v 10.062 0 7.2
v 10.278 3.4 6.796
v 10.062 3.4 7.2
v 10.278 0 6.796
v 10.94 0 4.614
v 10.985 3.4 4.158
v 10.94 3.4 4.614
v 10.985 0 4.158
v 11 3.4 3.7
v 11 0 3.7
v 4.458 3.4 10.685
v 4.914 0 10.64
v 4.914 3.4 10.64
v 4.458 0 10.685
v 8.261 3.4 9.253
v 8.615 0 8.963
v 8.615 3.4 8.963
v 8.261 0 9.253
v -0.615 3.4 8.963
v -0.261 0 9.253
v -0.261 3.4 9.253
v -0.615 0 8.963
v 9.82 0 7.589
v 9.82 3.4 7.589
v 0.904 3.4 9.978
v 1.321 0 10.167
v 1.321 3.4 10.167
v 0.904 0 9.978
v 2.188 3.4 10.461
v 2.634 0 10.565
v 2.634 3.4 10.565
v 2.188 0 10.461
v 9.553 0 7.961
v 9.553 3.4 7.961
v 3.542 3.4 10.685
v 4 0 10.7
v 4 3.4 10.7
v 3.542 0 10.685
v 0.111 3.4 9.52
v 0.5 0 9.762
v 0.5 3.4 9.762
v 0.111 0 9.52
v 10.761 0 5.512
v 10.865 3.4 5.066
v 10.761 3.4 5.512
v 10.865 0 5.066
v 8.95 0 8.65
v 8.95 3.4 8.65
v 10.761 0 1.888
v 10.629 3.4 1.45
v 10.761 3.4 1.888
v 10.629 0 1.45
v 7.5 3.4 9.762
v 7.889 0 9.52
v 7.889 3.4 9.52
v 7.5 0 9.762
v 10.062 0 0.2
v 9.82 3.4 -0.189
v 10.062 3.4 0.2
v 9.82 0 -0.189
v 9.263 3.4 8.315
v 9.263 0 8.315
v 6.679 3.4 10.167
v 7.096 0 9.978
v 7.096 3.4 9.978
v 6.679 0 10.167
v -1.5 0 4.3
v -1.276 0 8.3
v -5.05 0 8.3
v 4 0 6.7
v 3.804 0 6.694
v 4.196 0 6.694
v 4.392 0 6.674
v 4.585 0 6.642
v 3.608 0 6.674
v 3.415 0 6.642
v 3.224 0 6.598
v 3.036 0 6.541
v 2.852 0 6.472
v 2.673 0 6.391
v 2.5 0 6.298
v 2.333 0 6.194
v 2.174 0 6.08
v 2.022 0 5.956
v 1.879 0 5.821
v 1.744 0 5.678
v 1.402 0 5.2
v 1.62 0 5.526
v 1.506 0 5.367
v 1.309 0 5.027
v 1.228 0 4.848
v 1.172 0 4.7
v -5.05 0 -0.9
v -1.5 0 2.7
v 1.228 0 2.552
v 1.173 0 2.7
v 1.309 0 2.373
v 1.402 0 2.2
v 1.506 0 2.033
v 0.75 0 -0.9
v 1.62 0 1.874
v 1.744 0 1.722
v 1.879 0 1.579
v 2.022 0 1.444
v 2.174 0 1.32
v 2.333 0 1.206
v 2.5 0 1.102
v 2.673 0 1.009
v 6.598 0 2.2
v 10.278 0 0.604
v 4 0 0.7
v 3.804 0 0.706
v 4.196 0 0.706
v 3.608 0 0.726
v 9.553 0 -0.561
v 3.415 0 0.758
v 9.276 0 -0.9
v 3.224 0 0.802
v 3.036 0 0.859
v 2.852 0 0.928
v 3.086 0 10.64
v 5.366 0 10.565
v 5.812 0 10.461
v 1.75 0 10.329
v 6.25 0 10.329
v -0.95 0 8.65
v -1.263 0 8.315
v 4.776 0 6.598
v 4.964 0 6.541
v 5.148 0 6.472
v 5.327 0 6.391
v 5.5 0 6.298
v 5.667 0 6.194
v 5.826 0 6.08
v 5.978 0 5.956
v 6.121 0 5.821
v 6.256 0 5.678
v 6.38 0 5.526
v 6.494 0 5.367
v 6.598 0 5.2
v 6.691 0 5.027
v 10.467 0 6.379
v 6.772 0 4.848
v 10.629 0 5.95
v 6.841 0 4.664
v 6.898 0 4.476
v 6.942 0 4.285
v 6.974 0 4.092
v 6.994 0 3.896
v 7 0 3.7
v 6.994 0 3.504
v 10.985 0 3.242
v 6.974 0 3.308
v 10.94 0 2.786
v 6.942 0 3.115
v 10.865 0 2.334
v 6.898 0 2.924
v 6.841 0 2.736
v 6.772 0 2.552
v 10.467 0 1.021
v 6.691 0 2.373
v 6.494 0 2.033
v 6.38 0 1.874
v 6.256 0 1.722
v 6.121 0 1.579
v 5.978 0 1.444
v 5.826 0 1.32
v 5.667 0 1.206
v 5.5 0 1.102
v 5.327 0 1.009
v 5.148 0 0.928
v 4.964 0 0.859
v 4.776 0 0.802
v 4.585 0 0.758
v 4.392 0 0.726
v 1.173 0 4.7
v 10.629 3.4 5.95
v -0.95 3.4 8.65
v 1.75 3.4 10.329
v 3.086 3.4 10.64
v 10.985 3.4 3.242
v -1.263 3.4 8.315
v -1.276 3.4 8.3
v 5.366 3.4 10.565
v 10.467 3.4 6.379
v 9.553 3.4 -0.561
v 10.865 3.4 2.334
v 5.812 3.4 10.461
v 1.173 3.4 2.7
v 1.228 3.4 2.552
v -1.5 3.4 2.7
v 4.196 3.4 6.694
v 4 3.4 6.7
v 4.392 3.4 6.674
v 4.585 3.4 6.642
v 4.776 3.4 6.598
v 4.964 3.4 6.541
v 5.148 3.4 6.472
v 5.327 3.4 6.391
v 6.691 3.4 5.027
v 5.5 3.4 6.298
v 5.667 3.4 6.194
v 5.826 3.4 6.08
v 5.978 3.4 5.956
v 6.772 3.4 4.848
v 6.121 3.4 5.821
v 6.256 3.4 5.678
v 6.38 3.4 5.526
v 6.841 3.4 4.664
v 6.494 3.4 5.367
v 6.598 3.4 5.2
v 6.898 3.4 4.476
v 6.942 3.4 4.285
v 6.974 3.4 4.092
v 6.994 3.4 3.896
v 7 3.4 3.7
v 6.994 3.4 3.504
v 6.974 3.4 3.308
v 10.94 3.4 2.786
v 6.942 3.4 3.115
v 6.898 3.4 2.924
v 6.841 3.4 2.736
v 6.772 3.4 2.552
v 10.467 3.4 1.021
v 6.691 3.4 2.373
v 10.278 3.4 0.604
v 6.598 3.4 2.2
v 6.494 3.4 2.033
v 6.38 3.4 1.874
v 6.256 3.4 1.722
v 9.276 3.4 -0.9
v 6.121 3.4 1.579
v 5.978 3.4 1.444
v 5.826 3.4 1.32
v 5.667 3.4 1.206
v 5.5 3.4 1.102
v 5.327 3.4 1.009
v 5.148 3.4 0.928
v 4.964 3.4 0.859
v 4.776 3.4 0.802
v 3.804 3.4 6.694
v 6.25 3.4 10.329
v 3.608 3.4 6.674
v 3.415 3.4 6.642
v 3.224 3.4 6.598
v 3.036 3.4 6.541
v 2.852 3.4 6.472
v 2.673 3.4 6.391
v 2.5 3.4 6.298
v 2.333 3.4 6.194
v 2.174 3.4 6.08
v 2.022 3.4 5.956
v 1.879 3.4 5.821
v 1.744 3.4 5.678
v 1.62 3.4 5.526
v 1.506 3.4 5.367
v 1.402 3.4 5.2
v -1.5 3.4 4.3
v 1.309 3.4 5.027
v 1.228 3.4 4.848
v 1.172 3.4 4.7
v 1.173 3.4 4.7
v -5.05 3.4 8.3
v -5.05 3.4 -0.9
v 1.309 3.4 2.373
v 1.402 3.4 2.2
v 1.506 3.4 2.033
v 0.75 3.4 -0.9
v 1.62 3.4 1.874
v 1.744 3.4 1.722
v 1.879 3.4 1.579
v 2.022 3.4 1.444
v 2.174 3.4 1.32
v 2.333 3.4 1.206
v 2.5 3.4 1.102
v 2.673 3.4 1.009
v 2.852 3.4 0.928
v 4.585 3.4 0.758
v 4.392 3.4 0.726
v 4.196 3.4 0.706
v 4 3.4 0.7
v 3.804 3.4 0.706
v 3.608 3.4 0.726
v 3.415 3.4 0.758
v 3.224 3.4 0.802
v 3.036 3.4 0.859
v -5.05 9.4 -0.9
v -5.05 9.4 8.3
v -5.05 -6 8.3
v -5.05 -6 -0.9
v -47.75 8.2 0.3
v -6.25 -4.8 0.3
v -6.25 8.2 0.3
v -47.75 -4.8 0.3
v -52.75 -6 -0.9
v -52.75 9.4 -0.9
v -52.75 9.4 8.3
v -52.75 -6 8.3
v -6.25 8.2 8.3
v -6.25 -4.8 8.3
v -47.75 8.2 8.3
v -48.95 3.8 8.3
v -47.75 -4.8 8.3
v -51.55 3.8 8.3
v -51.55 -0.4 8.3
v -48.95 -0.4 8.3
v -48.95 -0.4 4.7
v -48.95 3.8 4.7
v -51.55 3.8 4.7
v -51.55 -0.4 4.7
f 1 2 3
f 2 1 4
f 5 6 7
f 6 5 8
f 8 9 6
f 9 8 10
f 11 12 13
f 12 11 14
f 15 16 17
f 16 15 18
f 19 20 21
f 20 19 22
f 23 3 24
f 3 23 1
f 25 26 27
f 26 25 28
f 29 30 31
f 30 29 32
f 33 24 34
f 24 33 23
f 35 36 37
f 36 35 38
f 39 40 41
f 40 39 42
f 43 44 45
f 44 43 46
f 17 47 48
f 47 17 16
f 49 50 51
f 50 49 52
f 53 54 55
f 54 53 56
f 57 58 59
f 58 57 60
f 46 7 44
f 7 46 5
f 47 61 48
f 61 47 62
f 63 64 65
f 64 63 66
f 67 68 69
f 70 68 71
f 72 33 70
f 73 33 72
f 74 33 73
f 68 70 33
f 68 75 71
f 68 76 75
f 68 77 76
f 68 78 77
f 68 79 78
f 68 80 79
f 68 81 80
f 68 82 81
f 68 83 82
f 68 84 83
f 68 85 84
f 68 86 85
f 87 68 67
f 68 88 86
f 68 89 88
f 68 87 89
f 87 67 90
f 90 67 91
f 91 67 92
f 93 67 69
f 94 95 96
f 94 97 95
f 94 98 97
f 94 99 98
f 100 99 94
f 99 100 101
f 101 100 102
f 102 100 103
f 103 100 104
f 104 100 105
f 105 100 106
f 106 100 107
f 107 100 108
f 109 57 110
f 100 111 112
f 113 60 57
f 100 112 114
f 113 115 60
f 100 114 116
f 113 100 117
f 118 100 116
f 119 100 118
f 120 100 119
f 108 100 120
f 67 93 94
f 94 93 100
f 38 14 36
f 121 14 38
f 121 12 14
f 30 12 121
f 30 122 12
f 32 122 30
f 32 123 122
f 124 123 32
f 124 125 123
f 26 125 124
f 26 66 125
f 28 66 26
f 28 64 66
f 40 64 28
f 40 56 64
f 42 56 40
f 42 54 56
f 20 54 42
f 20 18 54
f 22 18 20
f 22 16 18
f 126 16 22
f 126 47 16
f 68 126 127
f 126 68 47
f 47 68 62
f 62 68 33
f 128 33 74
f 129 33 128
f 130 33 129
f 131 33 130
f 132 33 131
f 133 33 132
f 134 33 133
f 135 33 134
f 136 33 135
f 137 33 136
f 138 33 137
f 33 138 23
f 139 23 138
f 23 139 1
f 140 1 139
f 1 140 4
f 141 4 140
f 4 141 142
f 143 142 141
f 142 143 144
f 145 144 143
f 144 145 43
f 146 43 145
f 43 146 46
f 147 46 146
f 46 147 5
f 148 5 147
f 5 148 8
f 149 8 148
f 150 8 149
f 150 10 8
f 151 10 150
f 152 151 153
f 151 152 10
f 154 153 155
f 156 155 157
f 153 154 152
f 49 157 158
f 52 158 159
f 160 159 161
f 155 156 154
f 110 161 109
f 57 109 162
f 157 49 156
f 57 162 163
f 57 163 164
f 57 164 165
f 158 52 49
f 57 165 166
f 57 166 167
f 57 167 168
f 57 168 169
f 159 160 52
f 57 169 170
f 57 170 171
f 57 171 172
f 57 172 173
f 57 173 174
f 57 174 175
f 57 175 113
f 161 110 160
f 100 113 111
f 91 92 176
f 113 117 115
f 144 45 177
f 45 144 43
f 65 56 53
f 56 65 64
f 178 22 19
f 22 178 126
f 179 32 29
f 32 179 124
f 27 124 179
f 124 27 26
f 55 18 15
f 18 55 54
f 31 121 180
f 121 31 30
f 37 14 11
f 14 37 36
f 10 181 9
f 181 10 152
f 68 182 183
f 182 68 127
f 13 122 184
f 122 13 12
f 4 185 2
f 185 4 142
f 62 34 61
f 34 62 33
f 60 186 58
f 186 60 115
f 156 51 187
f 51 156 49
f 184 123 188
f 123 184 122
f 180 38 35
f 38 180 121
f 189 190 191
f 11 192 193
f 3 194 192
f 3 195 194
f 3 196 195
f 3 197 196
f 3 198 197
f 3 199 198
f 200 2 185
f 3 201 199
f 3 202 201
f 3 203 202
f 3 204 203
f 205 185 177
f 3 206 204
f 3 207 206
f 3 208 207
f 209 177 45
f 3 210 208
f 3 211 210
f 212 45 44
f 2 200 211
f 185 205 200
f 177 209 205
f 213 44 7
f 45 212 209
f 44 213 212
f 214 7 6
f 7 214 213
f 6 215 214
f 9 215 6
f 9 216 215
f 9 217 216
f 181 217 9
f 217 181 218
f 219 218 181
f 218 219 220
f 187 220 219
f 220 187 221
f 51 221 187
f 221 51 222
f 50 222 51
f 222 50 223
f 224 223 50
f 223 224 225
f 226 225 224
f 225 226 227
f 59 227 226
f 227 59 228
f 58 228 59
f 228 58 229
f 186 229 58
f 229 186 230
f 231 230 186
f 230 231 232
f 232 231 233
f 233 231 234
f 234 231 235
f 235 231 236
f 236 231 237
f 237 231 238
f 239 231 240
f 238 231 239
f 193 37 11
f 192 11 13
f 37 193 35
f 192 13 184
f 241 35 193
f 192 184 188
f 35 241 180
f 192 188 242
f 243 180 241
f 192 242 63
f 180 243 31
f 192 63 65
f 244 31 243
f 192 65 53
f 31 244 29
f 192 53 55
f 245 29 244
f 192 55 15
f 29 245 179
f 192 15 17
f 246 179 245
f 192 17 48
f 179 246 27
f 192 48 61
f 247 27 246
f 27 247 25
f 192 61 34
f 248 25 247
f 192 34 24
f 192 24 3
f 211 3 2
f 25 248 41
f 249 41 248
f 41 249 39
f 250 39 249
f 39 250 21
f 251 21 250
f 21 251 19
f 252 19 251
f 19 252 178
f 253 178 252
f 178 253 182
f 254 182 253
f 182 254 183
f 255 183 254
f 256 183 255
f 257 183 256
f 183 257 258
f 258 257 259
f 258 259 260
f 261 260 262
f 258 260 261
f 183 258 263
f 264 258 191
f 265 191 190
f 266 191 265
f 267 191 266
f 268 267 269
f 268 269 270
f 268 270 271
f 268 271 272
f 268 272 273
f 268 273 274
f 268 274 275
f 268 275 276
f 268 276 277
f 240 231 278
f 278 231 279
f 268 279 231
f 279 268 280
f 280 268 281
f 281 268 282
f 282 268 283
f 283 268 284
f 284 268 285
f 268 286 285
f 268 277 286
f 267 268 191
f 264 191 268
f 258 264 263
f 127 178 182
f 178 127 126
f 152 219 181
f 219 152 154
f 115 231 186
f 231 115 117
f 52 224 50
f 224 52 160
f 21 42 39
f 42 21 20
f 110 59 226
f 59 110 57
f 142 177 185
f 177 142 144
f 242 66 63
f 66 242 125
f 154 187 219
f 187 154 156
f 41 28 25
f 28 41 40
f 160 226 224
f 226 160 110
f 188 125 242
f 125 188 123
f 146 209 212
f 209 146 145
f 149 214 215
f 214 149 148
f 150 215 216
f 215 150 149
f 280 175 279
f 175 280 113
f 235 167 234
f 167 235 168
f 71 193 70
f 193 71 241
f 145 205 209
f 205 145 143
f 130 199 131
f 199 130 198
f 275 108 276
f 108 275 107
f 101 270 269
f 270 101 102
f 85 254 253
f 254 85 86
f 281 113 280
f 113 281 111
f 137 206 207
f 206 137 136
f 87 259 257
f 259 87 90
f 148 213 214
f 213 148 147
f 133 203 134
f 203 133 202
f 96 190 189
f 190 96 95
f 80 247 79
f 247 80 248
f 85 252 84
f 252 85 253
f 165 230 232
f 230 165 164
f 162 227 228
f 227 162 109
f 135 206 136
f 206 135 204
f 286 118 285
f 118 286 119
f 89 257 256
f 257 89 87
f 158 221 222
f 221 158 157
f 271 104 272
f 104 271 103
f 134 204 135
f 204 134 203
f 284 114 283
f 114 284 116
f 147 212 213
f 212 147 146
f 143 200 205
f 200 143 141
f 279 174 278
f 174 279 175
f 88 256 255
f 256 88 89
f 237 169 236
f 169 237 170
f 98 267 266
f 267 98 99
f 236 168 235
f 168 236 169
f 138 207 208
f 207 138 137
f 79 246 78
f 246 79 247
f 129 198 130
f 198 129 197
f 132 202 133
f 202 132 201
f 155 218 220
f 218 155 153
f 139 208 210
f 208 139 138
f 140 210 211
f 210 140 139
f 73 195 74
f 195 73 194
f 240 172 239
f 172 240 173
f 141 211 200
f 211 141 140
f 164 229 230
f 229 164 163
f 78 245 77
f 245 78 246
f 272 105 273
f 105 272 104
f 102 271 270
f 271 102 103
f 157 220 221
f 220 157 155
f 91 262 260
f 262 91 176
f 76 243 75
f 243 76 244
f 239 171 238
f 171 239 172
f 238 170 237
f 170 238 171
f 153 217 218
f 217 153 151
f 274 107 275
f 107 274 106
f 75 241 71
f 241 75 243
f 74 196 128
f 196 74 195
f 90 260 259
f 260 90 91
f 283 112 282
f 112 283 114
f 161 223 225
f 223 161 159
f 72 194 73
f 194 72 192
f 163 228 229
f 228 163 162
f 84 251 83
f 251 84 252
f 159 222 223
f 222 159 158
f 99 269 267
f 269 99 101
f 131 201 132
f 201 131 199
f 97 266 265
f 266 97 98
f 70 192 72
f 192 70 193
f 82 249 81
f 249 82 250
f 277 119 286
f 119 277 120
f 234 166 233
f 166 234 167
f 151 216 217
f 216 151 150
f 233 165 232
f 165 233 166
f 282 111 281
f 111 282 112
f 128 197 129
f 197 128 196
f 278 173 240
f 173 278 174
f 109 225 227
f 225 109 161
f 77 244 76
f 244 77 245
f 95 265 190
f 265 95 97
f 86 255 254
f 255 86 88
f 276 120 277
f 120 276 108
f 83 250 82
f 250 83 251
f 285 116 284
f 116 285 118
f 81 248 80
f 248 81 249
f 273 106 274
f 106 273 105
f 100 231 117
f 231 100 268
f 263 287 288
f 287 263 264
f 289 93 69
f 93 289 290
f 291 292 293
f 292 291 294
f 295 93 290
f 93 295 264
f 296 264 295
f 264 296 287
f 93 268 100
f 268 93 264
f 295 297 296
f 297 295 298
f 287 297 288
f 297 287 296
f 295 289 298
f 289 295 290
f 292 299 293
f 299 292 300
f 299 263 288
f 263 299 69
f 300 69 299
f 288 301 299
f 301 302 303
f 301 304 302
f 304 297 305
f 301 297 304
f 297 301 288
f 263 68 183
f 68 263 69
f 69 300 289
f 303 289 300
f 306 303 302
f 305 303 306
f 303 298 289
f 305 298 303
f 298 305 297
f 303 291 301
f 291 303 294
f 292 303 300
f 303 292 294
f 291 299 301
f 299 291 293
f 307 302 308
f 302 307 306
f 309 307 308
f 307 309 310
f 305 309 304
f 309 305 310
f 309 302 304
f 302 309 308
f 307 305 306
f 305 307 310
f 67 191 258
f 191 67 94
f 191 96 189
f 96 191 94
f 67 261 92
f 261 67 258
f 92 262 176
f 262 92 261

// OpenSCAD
// DOUBLE TAKE FRAMES — DRY/WET UNIVERSAL LATCH
// DTF_RELEASE: 4.0.0
// Release revision: 4.0.0
// Based on latch-and-keeper-v2.0.4-pending.scad and the approved geometry from
// latch-top-eyelet-v0.2.6-experimental.scad.
// Status: CANONICAL.
//
// Pending change in 2.2.4:
// - Extends the removable wet-eyelet cutter-access neck to 2.40 mm in Z.
// - Thickens the permanent eyelet opposite the cut: the radial wall increases
//   from 2.20 to 3.00 mm and its X thickness increases from 3.40 to 4.20 mm.
// - Preserves the 2.40 mm bore, mounting center, and 0.60 mm snip core.
//
// Pending change in 2.2.3:
// - Extends the removable wet-eyelet neck to 1.80 mm in Z so cutter jaws can
//   engage it without loading and splitting the permanent eyelet ring.
// - Retains the centered 0.60 mm one-nozzle core as the actual snip section.
//
// Pending change in 2.2.2:
// - Tapers each wet-loop snip neck through the loop thickness as well as in
//   its Y/Z profile, using opposed conical face reliefs.
// - Leaves only a centered 0.60 mm one-nozzle core to cut while preserving the
//   full-strength permanent ring and root away from the disposable neck.
//
// Pending change in 2.2.1:
// - Toughens only the wet=true top suspension loops: increases their X
//   thickness, radial wall, and latch-root engagement.
// - Replaces the sub-line snip ligament with a calculated tapered neck whose
//   weakest radial section is one predictable 0.60 mm nozzle line.
// - Leaves the standard/dry latch and every mating datum unchanged.
//
// Pending change in 2.2.0:
// - Mirrors the complete wet latch in X about the fixed rig's wall midpoint.
//   The pivot eye, bayonet keyway, weight corral, keyed socket, and both wet
//   suspension eyelets therefore reverse together and remain registered with
//   wall-rig v2.1.0.
// - Keeps wet_latch=false geometry and every local working dimension unchanged.
//
// Pending change in 2.1.3:
// - Replaces each rounded wet-eyelet snip-slot cap with a tapered polygonal
//   void. Its upper roof is 45 degrees in print Z, eliminating the tiny
//   downward-facing cap facets that could form stalactites.
// - Preserves the approved user-facing bridge location and at least 0.45 mm
//   of sacrificial material for post-print snipping.
//
// Pending change in 2.1.2:
// - Raises both user-facing wet-eyelet snip voids by 15 degrees to provide
//   clearer cutter access above the adjoining latch structure.
// - Keeps the 0.90 mm void width and 0.45 mm sacrificial bridge unchanged.
//
// Pending change in 2.1.1:
// - Mirrors both wet-eyelet snip voids across the Y centerline so the slit is
//   visible to the user in the installed assembly.
// - Keeps the approved downward Z orientation, 0.90 mm void width, and
//   0.45 mm sacrificial bridge unchanged.
//
// Pending change in 2.1.0:
// - Adds the same diagonal near-open void to both wet-latch suspension
//   eyelets. Each void merges with the bore but stops 0.45 mm short of the
//   exterior, leaving a one-line sacrificial bridge that can be snipped.
// - The voids exist only on the wet-latch eyelets; dry geometry is unchanged.
//
// Pending change in 2.0.5:
// - Consolidates the standard and double-top-eyelet latch carriages behind one
//   boolean. wet_latch=false emits the unchanged neutral/standard carriage;
//   wet_latch=true adds only the two established top suspension eyelets, far
//   ledge, and buttress from the v0.2.6 wet trial.
// - The 13.0 mm clear pocket, Y=-8.0 mm installed centerline, pivot eye, keyed
//   socket, retaining walls, and flat-floor print orientation are unchanged.
//
$fn = 96;

eps = 0.05;

// 0 = clipless keyed latch only (default)
// 1 = FN-weight latch only
// 2 = legacy C-shaped keeper only
render_part = 0;

// false = neutral/standard dry latch carriage
// true  = standard carriage plus the double top-eyelet wet suspension
wet_latch = false;

// Must match wall-rig v2.1.0. Mirroring about the fixed wall envelope's center
// reverses the wet mechanism without translating or widening the assembly.
wet_rig_wall_x0 = -66.1;
wet_rig_wall_x1 =  16.0;
wet_assembly_mirror_x = (wet_rig_wall_x0 + wet_rig_wall_x1) / 2;

// =========================================================
// FN WEIGHT LATCH
// =========================================================
post_d = 5.5;
// The keyed nub provides axial retention, so this pivot can remain freely
// rotating without the excessive wobble of the former 0.60 mm radial gap.
// A 0.40 mm radial gap remains generous for horizontal-hole shrinkage.
clear_radial = 0.25;
eye_inner_d = post_d + 2 * clear_radial;
eye_outer_d = 14.0;

// Clipless bayonet retention. A single inside/arm-side bore recess admits the
// fixed peg nub only at the installation angle. The outer eye ring stays
// continuous; rotation puts intact bore material behind the nub.
bayonet_lug_outer_r = 5.00;
// A symmetric one-nozzle-wide outer tip is simpler and more reliable than a
// barely visible one-sided taper. The structural root remains 1.80 mm wide.
bayonet_lug_tip_w = 0.60;
bayonet_key_radial_clear = 0.50;
// Preserve the approved 2.00 mm notch height where it meets the bore. At the
// outer mouth, its flat lower edge and diagonal upper roof leave 0.30 mm above
// the symmetric tip and 0.70 mm below it.
bayonet_notch_outer_r = bayonet_lug_outer_r + bayonet_key_radial_clear;
bayonet_notch_w = 2.00;
bayonet_notch_upper_mouth_clear = 0.30;
bayonet_notch_lower_z = -bayonet_notch_w / 2;
bayonet_notch_upper_bore_z = bayonet_notch_w / 2;
bayonet_notch_upper_mouth_z =
    bayonet_lug_tip_w / 2 + bayonet_notch_upper_mouth_clear;
bayonet_notch_bore_x =
    -sqrt(pow(eye_inner_d / 2, 2) - pow(bayonet_notch_upper_bore_z, 2));

latch_t = 3.4;
pivot_x = 4.0;

corral_clear_w_x = 41.5;
corral_clear_d_y = 13.0;
corral_wall_t = 1.2;
corral_depth_z = 8.0;
corral_floor_t = 1.2;
corral_end_wall_t_x = 5.0;
canonical_weight_center_x = -27.0;

// Match the installed latch plane used by the canonical dry-wall rig.
standoff_h = 0.8;
post_h = 4.0;
corral_global_outer_y1 = -0.30;
corral_center_y_target = corral_global_outer_y1
                         - (corral_clear_d_y + 2 * corral_wall_t) / 2;
pad_t = -corral_center_y_target - standoff_h - post_h / 2;
post_y1 = -pad_t - standoff_h - post_h;
latch_install_y = post_y1 + (post_h - latch_t) / 2;

corral_inner_x0 = canonical_weight_center_x - corral_clear_w_x / 2;
corral_inner_x1 = canonical_weight_center_x + corral_clear_w_x / 2;
corral_floor_x0 = corral_inner_x0 - corral_end_wall_t_x;
corral_floor_x1 = corral_inner_x1 + corral_wall_t;

corral_outer_y1 = corral_global_outer_y1 - latch_install_y;
corral_inner_y1 = corral_outer_y1 - corral_wall_t;
corral_inner_y0 = corral_inner_y1 - corral_clear_d_y;
corral_outer_y0 = corral_inner_y0 - corral_wall_t;

installed_corral_yc = latch_install_y
                      + (corral_inner_y0 + corral_inner_y1) / 2;
installed_eye_yc = latch_install_y + latch_t / 2;

corral_floor_z0 = -0.90;
corral_floor_z = corral_floor_z0 + corral_floor_t;
corral_wall_z1 = corral_floor_z + corral_depth_z;
pivot_z = (corral_floor_z0 + corral_wall_z1) / 2;
pivot_eye_flat_local_z = corral_floor_z0 - pivot_z;

pivot_transition_x0 = corral_floor_x1;
pivot_transition_x1 = pivot_x - (eye_inner_d / 2 + 0.25);

// =========================================================
// OPTIONAL WET DOUBLE-TOP-EYELET SUSPENSION
// =========================================================
// These are the unchanged working dimensions from top-eyelet v0.2.6.  The two
// bores share one Y/Z centerline and run longitudinally along X.
pva_nominal_d = 0.40;
support_eye_axis_y = (corral_outer_y0 + corral_outer_y1) / 2;
wet_latch_print_nozzle_d = 0.60;
support_eye_t_x = 4.20;
support_eye_inner_r = 1.20;
support_eye_outer_r = 4.20;
support_eye_base_half_w_y = latch_t / 2;
support_eye_center_z = corral_wall_z1 + 3.00;
support_eye_base_z0 = corral_wall_z1 - eps;
support_eye_base_z1 = corral_wall_z1 + 1.20;

support_eye_pivot_x = (pivot_transition_x0 + pivot_transition_x1) / 2;
support_eye_far_wall_overlap_x = 0.20;
support_eye_far_clearance_x = 1.00;
support_eye_far_x = corral_floor_x0 - support_eye_far_clearance_x
                    - support_eye_t_x / 2;
support_eye_far_ledge_t_z = 1.20;
support_eye_far_base_z0 = corral_wall_z1 - support_eye_far_ledge_t_z;
support_eye_far_base_z1 = corral_wall_z1;
support_eye_far_gusset_t_y = 2*support_eye_base_half_w_y;
support_eye_far_gusset_drop_z = 2.40;

// Post-print snip opening for both wet suspension eyelets. In the eyelet's
// Y/Z profile this points down and toward -Y so it faces the user when the
// latch is installed.
// The subtraction joins the bore but deliberately stops before the outside.
support_eye_snip_void_w = 0.90;
support_eye_snip_bridge = wet_latch_print_nozzle_d;
support_eye_snip_inner_y = -(support_eye_inner_r-0.10);
support_eye_snip_inner_top_z = support_eye_snip_void_w/2;
support_eye_snip_inner_bottom_z = -support_eye_snip_void_w/2;
support_eye_snip_outer_tip_w_z = 4*wet_latch_print_nozzle_d;
// Solve the 45-degree tapered roof against the circular eye profile so the
// lower outside tip leaves exactly one nozzle line of radial material. This
// makes the disposable neck predictable without weakening the working ring.
support_eye_snip_outer_target_r =
    support_eye_outer_r-support_eye_snip_bridge;
support_eye_snip_outer_solution_k =
    support_eye_snip_inner_top_z
    +abs(support_eye_snip_inner_y)
    -support_eye_snip_outer_tip_w_z;
support_eye_snip_outer_y = -(
    support_eye_snip_outer_solution_k
    +sqrt(
        2*pow(support_eye_snip_outer_target_r,2)
        -pow(support_eye_snip_outer_solution_k,2)
    )
    )/2;
support_eye_snip_outer_top_z = support_eye_snip_inner_top_z
    -abs(support_eye_snip_outer_y-support_eye_snip_inner_y);
support_eye_snip_outer_bottom_z = support_eye_snip_outer_top_z
    -support_eye_snip_outer_tip_w_z;
support_eye_snip_core_t_x = wet_latch_print_nozzle_d;
support_eye_snip_face_relief_d = 1.80;
support_eye_snip_core_relief_d = 0.70;
support_eye_snip_face_relief_depth_x =
    (support_eye_t_x-support_eye_snip_core_t_x)/2;

// Far-end Y-retention socket. The matching roof-hung tooth belongs to the
// fixed dry-wall rig; this socket is open at the top so the latch disengages
// cleanly as it swings downward.
latch_key_tooth_w_x = 1.4;
latch_key_tooth_w_y = 3.0;
latch_key_clear_xy = 0.60;
latch_key_clear_z = 0.60;
latch_key_engagement_z = 3.0;

latch_key_xc = (corral_floor_x0 + corral_inner_x0) / 2;
latch_key_local_yc = (corral_outer_y0 + corral_outer_y1) / 2;
latch_key_notch_x0 = latch_key_xc - latch_key_tooth_w_x / 2
                     - latch_key_clear_xy;
latch_key_notch_x1 = latch_key_xc + latch_key_tooth_w_x / 2
                     + latch_key_clear_xy;
latch_key_notch_y0 = latch_key_local_yc - latch_key_tooth_w_y / 2
                     - latch_key_clear_xy;
latch_key_notch_y1 = latch_key_local_yc + latch_key_tooth_w_y / 2
                     + latch_key_clear_xy;
latch_key_notch_z0 = corral_wall_z1 - latch_key_engagement_z
                     - latch_key_clear_z;

// =========================================================
// C-SHAPED KEEPER
// =========================================================
clip_outer_d = 10.0;
clip_t = 1.8;
grip_hole_d = 4.65;
gap_w = 2.8;
flat_depth = 1.5;

// =========================================================
// HELPERS
// =========================================================
module rect_prism(x0, x1, y0, y1, z0, z1) {
    translate([min(x0, x1), min(y0, y1), min(z0, z1)])
        cube([abs(x1 - x0), abs(y1 - y0), abs(z1 - z0)]);
}

module cyl_y_span(d, y0, y1) {
    translate([0, max(y0, y1), 0])
        rotate([90, 0, 0])
            cylinder(d=d, h=abs(y1 - y0), center=false);
}

// Profile coordinates are [Y,Z]. The extrusion transform maps its local
// extrusion axis to global X, so both wet eyelet bores run longitudinally.
module support_eye_outer_profile_2d(
    base_z0=support_eye_base_z0,
    base_z1=support_eye_base_z1
) {
    hull() {
        translate([support_eye_axis_y,support_eye_center_z])
            circle(r=support_eye_outer_r,$fn=48);
        translate([
            support_eye_axis_y-support_eye_base_half_w_y,
            base_z0
        ])
            square([
                2*support_eye_base_half_w_y,
                base_z1-base_z0
            ]);
    }
}

module support_eye_profile_2d(
    base_z0=support_eye_base_z0,
    base_z1=support_eye_base_z1
) {
    difference() {
        support_eye_outer_profile_2d(base_z0,base_z1);
        translate([support_eye_axis_y,support_eye_center_z])
            circle(r=support_eye_inner_r,$fn=48);
        support_eye_snip_void_2d();
    }
}

module support_eye_snip_void_2d() {
    translate([support_eye_axis_y,support_eye_center_z])
        polygon([
            [support_eye_snip_inner_y,
             support_eye_snip_inner_top_z],
            [support_eye_snip_outer_y,
             support_eye_snip_outer_top_z],
            [support_eye_snip_outer_y,
             support_eye_snip_outer_bottom_z],
            [support_eye_snip_inner_y,
             support_eye_snip_inner_bottom_z]
        ]);
}

module support_eye_snip_thickness_reliefs(xc) {
    neck_y = support_eye_axis_y
        +support_eye_snip_outer_y
        -support_eye_snip_bridge/2;
    neck_z = support_eye_center_z
        +(support_eye_snip_outer_top_z
          +support_eye_snip_outer_bottom_z)/2;

    // Opposed tapered pockets remove the full-thickness cutting burden but
    // stop one nozzle line apart at the eye's X center plane.
    translate([
        xc-support_eye_t_x/2-eps,
        neck_y,
        neck_z
    ])
        rotate([0,90,0])
            cylinder(
                h=support_eye_snip_face_relief_depth_x+eps,
                d1=support_eye_snip_face_relief_d,
                d2=support_eye_snip_core_relief_d,
                $fn=32
            );

    translate([
        xc+support_eye_t_x/2+eps,
        neck_y,
        neck_z
    ])
        rotate([0,-90,0])
            cylinder(
                h=support_eye_snip_face_relief_depth_x+eps,
                d1=support_eye_snip_face_relief_d,
                d2=support_eye_snip_core_relief_d,
                $fn=32
            );
}

module support_eye(
    xc,
    base_z0=support_eye_base_z0,
    base_z1=support_eye_base_z1
) {
    difference(){
        multmatrix([
            [0,0,1,xc-support_eye_t_x/2],
            [1,0,0,0],
            [0,1,0,0],
            [0,0,0,1]
        ])
            linear_extrude(height=support_eye_t_x)
                support_eye_profile_2d(base_z0,base_z1);

        support_eye_snip_thickness_reliefs(xc);
    }
}

module far_support_eye_ledge() {
    eye_inner_face_x = support_eye_far_x + support_eye_t_x/2;
    rect_prism(
        eye_inner_face_x-eps,
        corral_floor_x0+support_eye_far_wall_overlap_x,
        support_eye_axis_y-support_eye_base_half_w_y,
        support_eye_axis_y+support_eye_base_half_w_y,
        support_eye_far_base_z0,
        support_eye_far_base_z1
    );
}

module far_support_eye_gusset() {
    eye_outer_face_x = support_eye_far_x - support_eye_t_x/2;
    wall_root_x = corral_floor_x0 + support_eye_far_wall_overlap_x;
    gusset_y0 = support_eye_axis_y - support_eye_far_gusset_t_y/2;

    multmatrix([
        [1,0,0,0],
        [0,0,1,gusset_y0],
        [0,1,0,0],
        [0,0,0,1]
    ])
        linear_extrude(height=support_eye_far_gusset_t_y)
            polygon([
                [eye_outer_face_x+eps, support_eye_far_base_z0+eps],
                [wall_root_x,          support_eye_far_base_z0+eps],
                [wall_root_x,          support_eye_far_base_z0
                                       -support_eye_far_gusset_drop_z]
            ]);
}

module top_suspension_eye_assembly() {
    far_support_eye_ledge();
    far_support_eye_gusset();
    support_eye(
        support_eye_far_x,
        support_eye_far_base_z0,
        support_eye_far_base_z1
    );
    support_eye(support_eye_pivot_x);
}

// =========================================================
// PRINTABLE PARTS
// =========================================================
module canonical_latch_core() {
    translate([pivot_x, 0, pivot_z])
        difference() {
            cyl_y_span(eye_outer_d, 0, latch_t);
            cyl_y_span(eye_inner_d, -0.1, latch_t + 0.2);

            // Flatten only the unused lower eye arc so the complete latch
            // prints on the same plane as the corral floor.
            rect_prism(-eye_outer_d / 2 - 1,
                       eye_outer_d / 2 + 1,
                       -0.1, latch_t + 0.2,
                       -eye_outer_d / 2 - 1,
                       pivot_eye_flat_local_z);
        }
}

module fn_weight_corral() {
    difference() {
        union() {
            // Shallow floor beneath the weight pocket and keyed extension.
            rect_prism(corral_floor_x0, corral_floor_x1,
                       corral_outer_y0, corral_outer_y1,
                       corral_floor_z0, corral_floor_z);

            // Viewer-facing wall. The frame wall closes the opposite side.
            rect_prism(corral_inner_x0, corral_inner_x1,
                       corral_outer_y0, corral_inner_y0,
                       corral_floor_z, corral_wall_z1);

            // Matching opposite wall for universal dry/water use. It rises
            // directly from the existing floor, so the established flat-floor
            // print orientation gains no bridge or unsupported shelf. At
            // 1.2 mm it is two nominal lines with a 0.6 mm nozzle.
            rect_prism(corral_inner_x0, corral_inner_x1,
                       corral_inner_y1, corral_outer_y1,
                       corral_floor_z, corral_wall_z1);

            // Pivot-side wall.
            rect_prism(corral_inner_x1, corral_floor_x1,
                       corral_outer_y0, corral_outer_y1,
                       corral_floor_z, corral_wall_z1);

            // Substantial far-end wall carrying the retention socket.
            rect_prism(corral_floor_x0, corral_inner_x0,
                       corral_outer_y0, corral_outer_y1,
                       corral_floor_z, corral_wall_z1);

            // Compact load path from the corral into the pivot eye.
            rect_prism(pivot_transition_x0, pivot_transition_x1,
                       0, latch_t,
                       corral_floor_z0, corral_wall_z1);
        }

        rect_prism(latch_key_notch_x0, latch_key_notch_x1,
                   latch_key_notch_y0, latch_key_notch_y1,
                   latch_key_notch_z0, corral_wall_z1 + eps);
    }
}

module swinging_latch() {
    difference() {
        union() {
            canonical_latch_core();
            fn_weight_corral();
            if(wet_latch)
                top_suspension_eye_assembly();
        }

        // One asymmetric keyway cut after the eye and transition are united:
        // flat lower edge, printable diagonal upper roof, and full clearance
        // at the bore. No later union can fill the subtraction back in.
        translate([pivot_x,0,pivot_z])
            translate([0, latch_t + 0.1, 0])
                rotate([90,0,0])
                    linear_extrude(height = latch_t + 0.2)
                        polygon(points = [
                            [-bayonet_notch_outer_r, bayonet_notch_lower_z],
                            [0, bayonet_notch_lower_z],
                            [0, bayonet_notch_upper_bore_z],
                            [bayonet_notch_bore_x,
                             bayonet_notch_upper_bore_z],
                            [-bayonet_notch_outer_r,
                             bayonet_notch_upper_mouth_z]
                        ]);
    }
}

module selected_swinging_latch(){
    if(wet_latch)
        translate([2*wet_assembly_mirror_x,0,0])
            mirror([1,0,0])
                swinging_latch();
    else
        swinging_latch();
}

module c_keeper() {
    difference() {
        cyl_y_span(clip_outer_d, 0, clip_t);
        cyl_y_span(grip_hole_d, -0.1, clip_t + 0.2);

        rect_prism(0, clip_outer_d / 2 + 0.5,
                   -0.1, clip_t + 0.1,
                   -gap_w / 2, gap_w / 2);

        rect_prism(grip_hole_d / 2 - 0.2,
                   grip_hole_d / 2 - 0.2 + flat_depth,
                   -0.1, clip_t + 0.1,
                   -gap_w / 2 - 0.4, gap_w / 2 + 0.4);
    }
}

assert(corral_clear_w_x == 41.5);
assert(corral_clear_d_y == 13.0);
assert(pivot_transition_x1 > pivot_transition_x0);
assert(abs(installed_corral_yc + 8.0) < eps,
       "pen/weight pocket no longer uses the measured Y=-8 mm centerline");
assert(abs(installed_eye_yc - installed_corral_yc) < eps,
       "pen/weight pocket is no longer centered on the pivot eye");
assert(abs((corral_inner_y1-corral_inner_y0) - corral_clear_d_y) < eps,
       "opposite wall changed the 13 mm clear pocket depth");
assert(eye_outer_d / 2 - bayonet_notch_outer_r >= 1.49,
       "inside notch must preserve the continuous outer eye ring");
assert(bayonet_lug_outer_r - eye_inner_d / 2 >= 0.8,
       "bayonet lug has too little radial retention engagement");
assert(!wet_latch
       || 2*support_eye_inner_r >= 2*pva_nominal_d+0.8-eps,
       "wet support-eye passage is too tight for two nominal PVA strands");
assert(!wet_latch
       || support_eye_outer_r-support_eye_inner_r >= 1.80-eps,
       "wet support-eye working arch is too thin");
assert(!wet_latch
       || support_eye_snip_bridge >= wet_latch_print_nozzle_d-eps,
       "wet support-eye snip bridge is below one nozzle line");
assert(!wet_latch
       || support_eye_snip_core_t_x >= wet_latch_print_nozzle_d-eps,
       "wet support-eye snip core is below one nozzle line");
assert(!wet_latch
       || (support_eye_snip_face_relief_depth_x > 0
           && support_eye_snip_face_relief_d
                > support_eye_snip_core_relief_d),
       "wet support-eye thickness taper is invalid");
assert(!wet_latch
       || support_eye_snip_bridge+support_eye_snip_void_w
              < support_eye_outer_r-support_eye_inner_r+eps,
       "wet support-eye snip void leaves no radial bridge");
assert(!wet_latch
       || abs((support_eye_snip_outer_top_z
               -support_eye_snip_inner_top_z)
              /(support_eye_snip_outer_y-support_eye_snip_inner_y))
              >= 1-eps,
       "wet support-eye snip-void roof is shallower than 45 degrees");
assert(!wet_latch
       || support_eye_outer_r
          -sqrt(pow(support_eye_snip_outer_y,2)
                +pow(support_eye_snip_outer_bottom_z,2))
              >= support_eye_snip_bridge-eps,
       "wet support-eye snip void leaves too little sacrificial bridge");
assert(!wet_latch
       || 2*support_eye_inner_r <= 2.40+eps,
       "wet eyelet bore exceeds the intended short bridge span");
assert(!wet_latch
       || (support_eye_axis_y-support_eye_base_half_w_y >= -eps
           && support_eye_axis_y+support_eye_base_half_w_y <= latch_t+eps),
       "wet support-eye bases leave the solid latch Y span");
assert(!wet_latch
       || (support_eye_pivot_x-support_eye_t_x/2
               >= pivot_transition_x0-eps
           && support_eye_pivot_x+support_eye_t_x/2
               <= pivot_transition_x1+eps),
       "wet pivot support eye is not fully rooted in the transition");
assert(!wet_latch
       || abs(corral_floor_x0-(support_eye_far_x+support_eye_t_x/2)
              -support_eye_far_clearance_x) < eps,
       "wet far support eye lost its intended 1 mm clearance ledge");
assert(!wet_latch
       || support_eye_far_x+support_eye_t_x/2
              <= latch_key_notch_x0-1.90+eps,
       "wet far support eye intrudes into the keyed socket");
assert(!wet_latch
       || abs(support_eye_axis_y
              -(corral_outer_y0+corral_outer_y1)/2) < eps,
       "wet top support eyes no longer share the latch centerline");

if (render_part == 0 || render_part == 1)
    selected_swinging_latch();
else if (render_part == 2)
    c_keeper();
